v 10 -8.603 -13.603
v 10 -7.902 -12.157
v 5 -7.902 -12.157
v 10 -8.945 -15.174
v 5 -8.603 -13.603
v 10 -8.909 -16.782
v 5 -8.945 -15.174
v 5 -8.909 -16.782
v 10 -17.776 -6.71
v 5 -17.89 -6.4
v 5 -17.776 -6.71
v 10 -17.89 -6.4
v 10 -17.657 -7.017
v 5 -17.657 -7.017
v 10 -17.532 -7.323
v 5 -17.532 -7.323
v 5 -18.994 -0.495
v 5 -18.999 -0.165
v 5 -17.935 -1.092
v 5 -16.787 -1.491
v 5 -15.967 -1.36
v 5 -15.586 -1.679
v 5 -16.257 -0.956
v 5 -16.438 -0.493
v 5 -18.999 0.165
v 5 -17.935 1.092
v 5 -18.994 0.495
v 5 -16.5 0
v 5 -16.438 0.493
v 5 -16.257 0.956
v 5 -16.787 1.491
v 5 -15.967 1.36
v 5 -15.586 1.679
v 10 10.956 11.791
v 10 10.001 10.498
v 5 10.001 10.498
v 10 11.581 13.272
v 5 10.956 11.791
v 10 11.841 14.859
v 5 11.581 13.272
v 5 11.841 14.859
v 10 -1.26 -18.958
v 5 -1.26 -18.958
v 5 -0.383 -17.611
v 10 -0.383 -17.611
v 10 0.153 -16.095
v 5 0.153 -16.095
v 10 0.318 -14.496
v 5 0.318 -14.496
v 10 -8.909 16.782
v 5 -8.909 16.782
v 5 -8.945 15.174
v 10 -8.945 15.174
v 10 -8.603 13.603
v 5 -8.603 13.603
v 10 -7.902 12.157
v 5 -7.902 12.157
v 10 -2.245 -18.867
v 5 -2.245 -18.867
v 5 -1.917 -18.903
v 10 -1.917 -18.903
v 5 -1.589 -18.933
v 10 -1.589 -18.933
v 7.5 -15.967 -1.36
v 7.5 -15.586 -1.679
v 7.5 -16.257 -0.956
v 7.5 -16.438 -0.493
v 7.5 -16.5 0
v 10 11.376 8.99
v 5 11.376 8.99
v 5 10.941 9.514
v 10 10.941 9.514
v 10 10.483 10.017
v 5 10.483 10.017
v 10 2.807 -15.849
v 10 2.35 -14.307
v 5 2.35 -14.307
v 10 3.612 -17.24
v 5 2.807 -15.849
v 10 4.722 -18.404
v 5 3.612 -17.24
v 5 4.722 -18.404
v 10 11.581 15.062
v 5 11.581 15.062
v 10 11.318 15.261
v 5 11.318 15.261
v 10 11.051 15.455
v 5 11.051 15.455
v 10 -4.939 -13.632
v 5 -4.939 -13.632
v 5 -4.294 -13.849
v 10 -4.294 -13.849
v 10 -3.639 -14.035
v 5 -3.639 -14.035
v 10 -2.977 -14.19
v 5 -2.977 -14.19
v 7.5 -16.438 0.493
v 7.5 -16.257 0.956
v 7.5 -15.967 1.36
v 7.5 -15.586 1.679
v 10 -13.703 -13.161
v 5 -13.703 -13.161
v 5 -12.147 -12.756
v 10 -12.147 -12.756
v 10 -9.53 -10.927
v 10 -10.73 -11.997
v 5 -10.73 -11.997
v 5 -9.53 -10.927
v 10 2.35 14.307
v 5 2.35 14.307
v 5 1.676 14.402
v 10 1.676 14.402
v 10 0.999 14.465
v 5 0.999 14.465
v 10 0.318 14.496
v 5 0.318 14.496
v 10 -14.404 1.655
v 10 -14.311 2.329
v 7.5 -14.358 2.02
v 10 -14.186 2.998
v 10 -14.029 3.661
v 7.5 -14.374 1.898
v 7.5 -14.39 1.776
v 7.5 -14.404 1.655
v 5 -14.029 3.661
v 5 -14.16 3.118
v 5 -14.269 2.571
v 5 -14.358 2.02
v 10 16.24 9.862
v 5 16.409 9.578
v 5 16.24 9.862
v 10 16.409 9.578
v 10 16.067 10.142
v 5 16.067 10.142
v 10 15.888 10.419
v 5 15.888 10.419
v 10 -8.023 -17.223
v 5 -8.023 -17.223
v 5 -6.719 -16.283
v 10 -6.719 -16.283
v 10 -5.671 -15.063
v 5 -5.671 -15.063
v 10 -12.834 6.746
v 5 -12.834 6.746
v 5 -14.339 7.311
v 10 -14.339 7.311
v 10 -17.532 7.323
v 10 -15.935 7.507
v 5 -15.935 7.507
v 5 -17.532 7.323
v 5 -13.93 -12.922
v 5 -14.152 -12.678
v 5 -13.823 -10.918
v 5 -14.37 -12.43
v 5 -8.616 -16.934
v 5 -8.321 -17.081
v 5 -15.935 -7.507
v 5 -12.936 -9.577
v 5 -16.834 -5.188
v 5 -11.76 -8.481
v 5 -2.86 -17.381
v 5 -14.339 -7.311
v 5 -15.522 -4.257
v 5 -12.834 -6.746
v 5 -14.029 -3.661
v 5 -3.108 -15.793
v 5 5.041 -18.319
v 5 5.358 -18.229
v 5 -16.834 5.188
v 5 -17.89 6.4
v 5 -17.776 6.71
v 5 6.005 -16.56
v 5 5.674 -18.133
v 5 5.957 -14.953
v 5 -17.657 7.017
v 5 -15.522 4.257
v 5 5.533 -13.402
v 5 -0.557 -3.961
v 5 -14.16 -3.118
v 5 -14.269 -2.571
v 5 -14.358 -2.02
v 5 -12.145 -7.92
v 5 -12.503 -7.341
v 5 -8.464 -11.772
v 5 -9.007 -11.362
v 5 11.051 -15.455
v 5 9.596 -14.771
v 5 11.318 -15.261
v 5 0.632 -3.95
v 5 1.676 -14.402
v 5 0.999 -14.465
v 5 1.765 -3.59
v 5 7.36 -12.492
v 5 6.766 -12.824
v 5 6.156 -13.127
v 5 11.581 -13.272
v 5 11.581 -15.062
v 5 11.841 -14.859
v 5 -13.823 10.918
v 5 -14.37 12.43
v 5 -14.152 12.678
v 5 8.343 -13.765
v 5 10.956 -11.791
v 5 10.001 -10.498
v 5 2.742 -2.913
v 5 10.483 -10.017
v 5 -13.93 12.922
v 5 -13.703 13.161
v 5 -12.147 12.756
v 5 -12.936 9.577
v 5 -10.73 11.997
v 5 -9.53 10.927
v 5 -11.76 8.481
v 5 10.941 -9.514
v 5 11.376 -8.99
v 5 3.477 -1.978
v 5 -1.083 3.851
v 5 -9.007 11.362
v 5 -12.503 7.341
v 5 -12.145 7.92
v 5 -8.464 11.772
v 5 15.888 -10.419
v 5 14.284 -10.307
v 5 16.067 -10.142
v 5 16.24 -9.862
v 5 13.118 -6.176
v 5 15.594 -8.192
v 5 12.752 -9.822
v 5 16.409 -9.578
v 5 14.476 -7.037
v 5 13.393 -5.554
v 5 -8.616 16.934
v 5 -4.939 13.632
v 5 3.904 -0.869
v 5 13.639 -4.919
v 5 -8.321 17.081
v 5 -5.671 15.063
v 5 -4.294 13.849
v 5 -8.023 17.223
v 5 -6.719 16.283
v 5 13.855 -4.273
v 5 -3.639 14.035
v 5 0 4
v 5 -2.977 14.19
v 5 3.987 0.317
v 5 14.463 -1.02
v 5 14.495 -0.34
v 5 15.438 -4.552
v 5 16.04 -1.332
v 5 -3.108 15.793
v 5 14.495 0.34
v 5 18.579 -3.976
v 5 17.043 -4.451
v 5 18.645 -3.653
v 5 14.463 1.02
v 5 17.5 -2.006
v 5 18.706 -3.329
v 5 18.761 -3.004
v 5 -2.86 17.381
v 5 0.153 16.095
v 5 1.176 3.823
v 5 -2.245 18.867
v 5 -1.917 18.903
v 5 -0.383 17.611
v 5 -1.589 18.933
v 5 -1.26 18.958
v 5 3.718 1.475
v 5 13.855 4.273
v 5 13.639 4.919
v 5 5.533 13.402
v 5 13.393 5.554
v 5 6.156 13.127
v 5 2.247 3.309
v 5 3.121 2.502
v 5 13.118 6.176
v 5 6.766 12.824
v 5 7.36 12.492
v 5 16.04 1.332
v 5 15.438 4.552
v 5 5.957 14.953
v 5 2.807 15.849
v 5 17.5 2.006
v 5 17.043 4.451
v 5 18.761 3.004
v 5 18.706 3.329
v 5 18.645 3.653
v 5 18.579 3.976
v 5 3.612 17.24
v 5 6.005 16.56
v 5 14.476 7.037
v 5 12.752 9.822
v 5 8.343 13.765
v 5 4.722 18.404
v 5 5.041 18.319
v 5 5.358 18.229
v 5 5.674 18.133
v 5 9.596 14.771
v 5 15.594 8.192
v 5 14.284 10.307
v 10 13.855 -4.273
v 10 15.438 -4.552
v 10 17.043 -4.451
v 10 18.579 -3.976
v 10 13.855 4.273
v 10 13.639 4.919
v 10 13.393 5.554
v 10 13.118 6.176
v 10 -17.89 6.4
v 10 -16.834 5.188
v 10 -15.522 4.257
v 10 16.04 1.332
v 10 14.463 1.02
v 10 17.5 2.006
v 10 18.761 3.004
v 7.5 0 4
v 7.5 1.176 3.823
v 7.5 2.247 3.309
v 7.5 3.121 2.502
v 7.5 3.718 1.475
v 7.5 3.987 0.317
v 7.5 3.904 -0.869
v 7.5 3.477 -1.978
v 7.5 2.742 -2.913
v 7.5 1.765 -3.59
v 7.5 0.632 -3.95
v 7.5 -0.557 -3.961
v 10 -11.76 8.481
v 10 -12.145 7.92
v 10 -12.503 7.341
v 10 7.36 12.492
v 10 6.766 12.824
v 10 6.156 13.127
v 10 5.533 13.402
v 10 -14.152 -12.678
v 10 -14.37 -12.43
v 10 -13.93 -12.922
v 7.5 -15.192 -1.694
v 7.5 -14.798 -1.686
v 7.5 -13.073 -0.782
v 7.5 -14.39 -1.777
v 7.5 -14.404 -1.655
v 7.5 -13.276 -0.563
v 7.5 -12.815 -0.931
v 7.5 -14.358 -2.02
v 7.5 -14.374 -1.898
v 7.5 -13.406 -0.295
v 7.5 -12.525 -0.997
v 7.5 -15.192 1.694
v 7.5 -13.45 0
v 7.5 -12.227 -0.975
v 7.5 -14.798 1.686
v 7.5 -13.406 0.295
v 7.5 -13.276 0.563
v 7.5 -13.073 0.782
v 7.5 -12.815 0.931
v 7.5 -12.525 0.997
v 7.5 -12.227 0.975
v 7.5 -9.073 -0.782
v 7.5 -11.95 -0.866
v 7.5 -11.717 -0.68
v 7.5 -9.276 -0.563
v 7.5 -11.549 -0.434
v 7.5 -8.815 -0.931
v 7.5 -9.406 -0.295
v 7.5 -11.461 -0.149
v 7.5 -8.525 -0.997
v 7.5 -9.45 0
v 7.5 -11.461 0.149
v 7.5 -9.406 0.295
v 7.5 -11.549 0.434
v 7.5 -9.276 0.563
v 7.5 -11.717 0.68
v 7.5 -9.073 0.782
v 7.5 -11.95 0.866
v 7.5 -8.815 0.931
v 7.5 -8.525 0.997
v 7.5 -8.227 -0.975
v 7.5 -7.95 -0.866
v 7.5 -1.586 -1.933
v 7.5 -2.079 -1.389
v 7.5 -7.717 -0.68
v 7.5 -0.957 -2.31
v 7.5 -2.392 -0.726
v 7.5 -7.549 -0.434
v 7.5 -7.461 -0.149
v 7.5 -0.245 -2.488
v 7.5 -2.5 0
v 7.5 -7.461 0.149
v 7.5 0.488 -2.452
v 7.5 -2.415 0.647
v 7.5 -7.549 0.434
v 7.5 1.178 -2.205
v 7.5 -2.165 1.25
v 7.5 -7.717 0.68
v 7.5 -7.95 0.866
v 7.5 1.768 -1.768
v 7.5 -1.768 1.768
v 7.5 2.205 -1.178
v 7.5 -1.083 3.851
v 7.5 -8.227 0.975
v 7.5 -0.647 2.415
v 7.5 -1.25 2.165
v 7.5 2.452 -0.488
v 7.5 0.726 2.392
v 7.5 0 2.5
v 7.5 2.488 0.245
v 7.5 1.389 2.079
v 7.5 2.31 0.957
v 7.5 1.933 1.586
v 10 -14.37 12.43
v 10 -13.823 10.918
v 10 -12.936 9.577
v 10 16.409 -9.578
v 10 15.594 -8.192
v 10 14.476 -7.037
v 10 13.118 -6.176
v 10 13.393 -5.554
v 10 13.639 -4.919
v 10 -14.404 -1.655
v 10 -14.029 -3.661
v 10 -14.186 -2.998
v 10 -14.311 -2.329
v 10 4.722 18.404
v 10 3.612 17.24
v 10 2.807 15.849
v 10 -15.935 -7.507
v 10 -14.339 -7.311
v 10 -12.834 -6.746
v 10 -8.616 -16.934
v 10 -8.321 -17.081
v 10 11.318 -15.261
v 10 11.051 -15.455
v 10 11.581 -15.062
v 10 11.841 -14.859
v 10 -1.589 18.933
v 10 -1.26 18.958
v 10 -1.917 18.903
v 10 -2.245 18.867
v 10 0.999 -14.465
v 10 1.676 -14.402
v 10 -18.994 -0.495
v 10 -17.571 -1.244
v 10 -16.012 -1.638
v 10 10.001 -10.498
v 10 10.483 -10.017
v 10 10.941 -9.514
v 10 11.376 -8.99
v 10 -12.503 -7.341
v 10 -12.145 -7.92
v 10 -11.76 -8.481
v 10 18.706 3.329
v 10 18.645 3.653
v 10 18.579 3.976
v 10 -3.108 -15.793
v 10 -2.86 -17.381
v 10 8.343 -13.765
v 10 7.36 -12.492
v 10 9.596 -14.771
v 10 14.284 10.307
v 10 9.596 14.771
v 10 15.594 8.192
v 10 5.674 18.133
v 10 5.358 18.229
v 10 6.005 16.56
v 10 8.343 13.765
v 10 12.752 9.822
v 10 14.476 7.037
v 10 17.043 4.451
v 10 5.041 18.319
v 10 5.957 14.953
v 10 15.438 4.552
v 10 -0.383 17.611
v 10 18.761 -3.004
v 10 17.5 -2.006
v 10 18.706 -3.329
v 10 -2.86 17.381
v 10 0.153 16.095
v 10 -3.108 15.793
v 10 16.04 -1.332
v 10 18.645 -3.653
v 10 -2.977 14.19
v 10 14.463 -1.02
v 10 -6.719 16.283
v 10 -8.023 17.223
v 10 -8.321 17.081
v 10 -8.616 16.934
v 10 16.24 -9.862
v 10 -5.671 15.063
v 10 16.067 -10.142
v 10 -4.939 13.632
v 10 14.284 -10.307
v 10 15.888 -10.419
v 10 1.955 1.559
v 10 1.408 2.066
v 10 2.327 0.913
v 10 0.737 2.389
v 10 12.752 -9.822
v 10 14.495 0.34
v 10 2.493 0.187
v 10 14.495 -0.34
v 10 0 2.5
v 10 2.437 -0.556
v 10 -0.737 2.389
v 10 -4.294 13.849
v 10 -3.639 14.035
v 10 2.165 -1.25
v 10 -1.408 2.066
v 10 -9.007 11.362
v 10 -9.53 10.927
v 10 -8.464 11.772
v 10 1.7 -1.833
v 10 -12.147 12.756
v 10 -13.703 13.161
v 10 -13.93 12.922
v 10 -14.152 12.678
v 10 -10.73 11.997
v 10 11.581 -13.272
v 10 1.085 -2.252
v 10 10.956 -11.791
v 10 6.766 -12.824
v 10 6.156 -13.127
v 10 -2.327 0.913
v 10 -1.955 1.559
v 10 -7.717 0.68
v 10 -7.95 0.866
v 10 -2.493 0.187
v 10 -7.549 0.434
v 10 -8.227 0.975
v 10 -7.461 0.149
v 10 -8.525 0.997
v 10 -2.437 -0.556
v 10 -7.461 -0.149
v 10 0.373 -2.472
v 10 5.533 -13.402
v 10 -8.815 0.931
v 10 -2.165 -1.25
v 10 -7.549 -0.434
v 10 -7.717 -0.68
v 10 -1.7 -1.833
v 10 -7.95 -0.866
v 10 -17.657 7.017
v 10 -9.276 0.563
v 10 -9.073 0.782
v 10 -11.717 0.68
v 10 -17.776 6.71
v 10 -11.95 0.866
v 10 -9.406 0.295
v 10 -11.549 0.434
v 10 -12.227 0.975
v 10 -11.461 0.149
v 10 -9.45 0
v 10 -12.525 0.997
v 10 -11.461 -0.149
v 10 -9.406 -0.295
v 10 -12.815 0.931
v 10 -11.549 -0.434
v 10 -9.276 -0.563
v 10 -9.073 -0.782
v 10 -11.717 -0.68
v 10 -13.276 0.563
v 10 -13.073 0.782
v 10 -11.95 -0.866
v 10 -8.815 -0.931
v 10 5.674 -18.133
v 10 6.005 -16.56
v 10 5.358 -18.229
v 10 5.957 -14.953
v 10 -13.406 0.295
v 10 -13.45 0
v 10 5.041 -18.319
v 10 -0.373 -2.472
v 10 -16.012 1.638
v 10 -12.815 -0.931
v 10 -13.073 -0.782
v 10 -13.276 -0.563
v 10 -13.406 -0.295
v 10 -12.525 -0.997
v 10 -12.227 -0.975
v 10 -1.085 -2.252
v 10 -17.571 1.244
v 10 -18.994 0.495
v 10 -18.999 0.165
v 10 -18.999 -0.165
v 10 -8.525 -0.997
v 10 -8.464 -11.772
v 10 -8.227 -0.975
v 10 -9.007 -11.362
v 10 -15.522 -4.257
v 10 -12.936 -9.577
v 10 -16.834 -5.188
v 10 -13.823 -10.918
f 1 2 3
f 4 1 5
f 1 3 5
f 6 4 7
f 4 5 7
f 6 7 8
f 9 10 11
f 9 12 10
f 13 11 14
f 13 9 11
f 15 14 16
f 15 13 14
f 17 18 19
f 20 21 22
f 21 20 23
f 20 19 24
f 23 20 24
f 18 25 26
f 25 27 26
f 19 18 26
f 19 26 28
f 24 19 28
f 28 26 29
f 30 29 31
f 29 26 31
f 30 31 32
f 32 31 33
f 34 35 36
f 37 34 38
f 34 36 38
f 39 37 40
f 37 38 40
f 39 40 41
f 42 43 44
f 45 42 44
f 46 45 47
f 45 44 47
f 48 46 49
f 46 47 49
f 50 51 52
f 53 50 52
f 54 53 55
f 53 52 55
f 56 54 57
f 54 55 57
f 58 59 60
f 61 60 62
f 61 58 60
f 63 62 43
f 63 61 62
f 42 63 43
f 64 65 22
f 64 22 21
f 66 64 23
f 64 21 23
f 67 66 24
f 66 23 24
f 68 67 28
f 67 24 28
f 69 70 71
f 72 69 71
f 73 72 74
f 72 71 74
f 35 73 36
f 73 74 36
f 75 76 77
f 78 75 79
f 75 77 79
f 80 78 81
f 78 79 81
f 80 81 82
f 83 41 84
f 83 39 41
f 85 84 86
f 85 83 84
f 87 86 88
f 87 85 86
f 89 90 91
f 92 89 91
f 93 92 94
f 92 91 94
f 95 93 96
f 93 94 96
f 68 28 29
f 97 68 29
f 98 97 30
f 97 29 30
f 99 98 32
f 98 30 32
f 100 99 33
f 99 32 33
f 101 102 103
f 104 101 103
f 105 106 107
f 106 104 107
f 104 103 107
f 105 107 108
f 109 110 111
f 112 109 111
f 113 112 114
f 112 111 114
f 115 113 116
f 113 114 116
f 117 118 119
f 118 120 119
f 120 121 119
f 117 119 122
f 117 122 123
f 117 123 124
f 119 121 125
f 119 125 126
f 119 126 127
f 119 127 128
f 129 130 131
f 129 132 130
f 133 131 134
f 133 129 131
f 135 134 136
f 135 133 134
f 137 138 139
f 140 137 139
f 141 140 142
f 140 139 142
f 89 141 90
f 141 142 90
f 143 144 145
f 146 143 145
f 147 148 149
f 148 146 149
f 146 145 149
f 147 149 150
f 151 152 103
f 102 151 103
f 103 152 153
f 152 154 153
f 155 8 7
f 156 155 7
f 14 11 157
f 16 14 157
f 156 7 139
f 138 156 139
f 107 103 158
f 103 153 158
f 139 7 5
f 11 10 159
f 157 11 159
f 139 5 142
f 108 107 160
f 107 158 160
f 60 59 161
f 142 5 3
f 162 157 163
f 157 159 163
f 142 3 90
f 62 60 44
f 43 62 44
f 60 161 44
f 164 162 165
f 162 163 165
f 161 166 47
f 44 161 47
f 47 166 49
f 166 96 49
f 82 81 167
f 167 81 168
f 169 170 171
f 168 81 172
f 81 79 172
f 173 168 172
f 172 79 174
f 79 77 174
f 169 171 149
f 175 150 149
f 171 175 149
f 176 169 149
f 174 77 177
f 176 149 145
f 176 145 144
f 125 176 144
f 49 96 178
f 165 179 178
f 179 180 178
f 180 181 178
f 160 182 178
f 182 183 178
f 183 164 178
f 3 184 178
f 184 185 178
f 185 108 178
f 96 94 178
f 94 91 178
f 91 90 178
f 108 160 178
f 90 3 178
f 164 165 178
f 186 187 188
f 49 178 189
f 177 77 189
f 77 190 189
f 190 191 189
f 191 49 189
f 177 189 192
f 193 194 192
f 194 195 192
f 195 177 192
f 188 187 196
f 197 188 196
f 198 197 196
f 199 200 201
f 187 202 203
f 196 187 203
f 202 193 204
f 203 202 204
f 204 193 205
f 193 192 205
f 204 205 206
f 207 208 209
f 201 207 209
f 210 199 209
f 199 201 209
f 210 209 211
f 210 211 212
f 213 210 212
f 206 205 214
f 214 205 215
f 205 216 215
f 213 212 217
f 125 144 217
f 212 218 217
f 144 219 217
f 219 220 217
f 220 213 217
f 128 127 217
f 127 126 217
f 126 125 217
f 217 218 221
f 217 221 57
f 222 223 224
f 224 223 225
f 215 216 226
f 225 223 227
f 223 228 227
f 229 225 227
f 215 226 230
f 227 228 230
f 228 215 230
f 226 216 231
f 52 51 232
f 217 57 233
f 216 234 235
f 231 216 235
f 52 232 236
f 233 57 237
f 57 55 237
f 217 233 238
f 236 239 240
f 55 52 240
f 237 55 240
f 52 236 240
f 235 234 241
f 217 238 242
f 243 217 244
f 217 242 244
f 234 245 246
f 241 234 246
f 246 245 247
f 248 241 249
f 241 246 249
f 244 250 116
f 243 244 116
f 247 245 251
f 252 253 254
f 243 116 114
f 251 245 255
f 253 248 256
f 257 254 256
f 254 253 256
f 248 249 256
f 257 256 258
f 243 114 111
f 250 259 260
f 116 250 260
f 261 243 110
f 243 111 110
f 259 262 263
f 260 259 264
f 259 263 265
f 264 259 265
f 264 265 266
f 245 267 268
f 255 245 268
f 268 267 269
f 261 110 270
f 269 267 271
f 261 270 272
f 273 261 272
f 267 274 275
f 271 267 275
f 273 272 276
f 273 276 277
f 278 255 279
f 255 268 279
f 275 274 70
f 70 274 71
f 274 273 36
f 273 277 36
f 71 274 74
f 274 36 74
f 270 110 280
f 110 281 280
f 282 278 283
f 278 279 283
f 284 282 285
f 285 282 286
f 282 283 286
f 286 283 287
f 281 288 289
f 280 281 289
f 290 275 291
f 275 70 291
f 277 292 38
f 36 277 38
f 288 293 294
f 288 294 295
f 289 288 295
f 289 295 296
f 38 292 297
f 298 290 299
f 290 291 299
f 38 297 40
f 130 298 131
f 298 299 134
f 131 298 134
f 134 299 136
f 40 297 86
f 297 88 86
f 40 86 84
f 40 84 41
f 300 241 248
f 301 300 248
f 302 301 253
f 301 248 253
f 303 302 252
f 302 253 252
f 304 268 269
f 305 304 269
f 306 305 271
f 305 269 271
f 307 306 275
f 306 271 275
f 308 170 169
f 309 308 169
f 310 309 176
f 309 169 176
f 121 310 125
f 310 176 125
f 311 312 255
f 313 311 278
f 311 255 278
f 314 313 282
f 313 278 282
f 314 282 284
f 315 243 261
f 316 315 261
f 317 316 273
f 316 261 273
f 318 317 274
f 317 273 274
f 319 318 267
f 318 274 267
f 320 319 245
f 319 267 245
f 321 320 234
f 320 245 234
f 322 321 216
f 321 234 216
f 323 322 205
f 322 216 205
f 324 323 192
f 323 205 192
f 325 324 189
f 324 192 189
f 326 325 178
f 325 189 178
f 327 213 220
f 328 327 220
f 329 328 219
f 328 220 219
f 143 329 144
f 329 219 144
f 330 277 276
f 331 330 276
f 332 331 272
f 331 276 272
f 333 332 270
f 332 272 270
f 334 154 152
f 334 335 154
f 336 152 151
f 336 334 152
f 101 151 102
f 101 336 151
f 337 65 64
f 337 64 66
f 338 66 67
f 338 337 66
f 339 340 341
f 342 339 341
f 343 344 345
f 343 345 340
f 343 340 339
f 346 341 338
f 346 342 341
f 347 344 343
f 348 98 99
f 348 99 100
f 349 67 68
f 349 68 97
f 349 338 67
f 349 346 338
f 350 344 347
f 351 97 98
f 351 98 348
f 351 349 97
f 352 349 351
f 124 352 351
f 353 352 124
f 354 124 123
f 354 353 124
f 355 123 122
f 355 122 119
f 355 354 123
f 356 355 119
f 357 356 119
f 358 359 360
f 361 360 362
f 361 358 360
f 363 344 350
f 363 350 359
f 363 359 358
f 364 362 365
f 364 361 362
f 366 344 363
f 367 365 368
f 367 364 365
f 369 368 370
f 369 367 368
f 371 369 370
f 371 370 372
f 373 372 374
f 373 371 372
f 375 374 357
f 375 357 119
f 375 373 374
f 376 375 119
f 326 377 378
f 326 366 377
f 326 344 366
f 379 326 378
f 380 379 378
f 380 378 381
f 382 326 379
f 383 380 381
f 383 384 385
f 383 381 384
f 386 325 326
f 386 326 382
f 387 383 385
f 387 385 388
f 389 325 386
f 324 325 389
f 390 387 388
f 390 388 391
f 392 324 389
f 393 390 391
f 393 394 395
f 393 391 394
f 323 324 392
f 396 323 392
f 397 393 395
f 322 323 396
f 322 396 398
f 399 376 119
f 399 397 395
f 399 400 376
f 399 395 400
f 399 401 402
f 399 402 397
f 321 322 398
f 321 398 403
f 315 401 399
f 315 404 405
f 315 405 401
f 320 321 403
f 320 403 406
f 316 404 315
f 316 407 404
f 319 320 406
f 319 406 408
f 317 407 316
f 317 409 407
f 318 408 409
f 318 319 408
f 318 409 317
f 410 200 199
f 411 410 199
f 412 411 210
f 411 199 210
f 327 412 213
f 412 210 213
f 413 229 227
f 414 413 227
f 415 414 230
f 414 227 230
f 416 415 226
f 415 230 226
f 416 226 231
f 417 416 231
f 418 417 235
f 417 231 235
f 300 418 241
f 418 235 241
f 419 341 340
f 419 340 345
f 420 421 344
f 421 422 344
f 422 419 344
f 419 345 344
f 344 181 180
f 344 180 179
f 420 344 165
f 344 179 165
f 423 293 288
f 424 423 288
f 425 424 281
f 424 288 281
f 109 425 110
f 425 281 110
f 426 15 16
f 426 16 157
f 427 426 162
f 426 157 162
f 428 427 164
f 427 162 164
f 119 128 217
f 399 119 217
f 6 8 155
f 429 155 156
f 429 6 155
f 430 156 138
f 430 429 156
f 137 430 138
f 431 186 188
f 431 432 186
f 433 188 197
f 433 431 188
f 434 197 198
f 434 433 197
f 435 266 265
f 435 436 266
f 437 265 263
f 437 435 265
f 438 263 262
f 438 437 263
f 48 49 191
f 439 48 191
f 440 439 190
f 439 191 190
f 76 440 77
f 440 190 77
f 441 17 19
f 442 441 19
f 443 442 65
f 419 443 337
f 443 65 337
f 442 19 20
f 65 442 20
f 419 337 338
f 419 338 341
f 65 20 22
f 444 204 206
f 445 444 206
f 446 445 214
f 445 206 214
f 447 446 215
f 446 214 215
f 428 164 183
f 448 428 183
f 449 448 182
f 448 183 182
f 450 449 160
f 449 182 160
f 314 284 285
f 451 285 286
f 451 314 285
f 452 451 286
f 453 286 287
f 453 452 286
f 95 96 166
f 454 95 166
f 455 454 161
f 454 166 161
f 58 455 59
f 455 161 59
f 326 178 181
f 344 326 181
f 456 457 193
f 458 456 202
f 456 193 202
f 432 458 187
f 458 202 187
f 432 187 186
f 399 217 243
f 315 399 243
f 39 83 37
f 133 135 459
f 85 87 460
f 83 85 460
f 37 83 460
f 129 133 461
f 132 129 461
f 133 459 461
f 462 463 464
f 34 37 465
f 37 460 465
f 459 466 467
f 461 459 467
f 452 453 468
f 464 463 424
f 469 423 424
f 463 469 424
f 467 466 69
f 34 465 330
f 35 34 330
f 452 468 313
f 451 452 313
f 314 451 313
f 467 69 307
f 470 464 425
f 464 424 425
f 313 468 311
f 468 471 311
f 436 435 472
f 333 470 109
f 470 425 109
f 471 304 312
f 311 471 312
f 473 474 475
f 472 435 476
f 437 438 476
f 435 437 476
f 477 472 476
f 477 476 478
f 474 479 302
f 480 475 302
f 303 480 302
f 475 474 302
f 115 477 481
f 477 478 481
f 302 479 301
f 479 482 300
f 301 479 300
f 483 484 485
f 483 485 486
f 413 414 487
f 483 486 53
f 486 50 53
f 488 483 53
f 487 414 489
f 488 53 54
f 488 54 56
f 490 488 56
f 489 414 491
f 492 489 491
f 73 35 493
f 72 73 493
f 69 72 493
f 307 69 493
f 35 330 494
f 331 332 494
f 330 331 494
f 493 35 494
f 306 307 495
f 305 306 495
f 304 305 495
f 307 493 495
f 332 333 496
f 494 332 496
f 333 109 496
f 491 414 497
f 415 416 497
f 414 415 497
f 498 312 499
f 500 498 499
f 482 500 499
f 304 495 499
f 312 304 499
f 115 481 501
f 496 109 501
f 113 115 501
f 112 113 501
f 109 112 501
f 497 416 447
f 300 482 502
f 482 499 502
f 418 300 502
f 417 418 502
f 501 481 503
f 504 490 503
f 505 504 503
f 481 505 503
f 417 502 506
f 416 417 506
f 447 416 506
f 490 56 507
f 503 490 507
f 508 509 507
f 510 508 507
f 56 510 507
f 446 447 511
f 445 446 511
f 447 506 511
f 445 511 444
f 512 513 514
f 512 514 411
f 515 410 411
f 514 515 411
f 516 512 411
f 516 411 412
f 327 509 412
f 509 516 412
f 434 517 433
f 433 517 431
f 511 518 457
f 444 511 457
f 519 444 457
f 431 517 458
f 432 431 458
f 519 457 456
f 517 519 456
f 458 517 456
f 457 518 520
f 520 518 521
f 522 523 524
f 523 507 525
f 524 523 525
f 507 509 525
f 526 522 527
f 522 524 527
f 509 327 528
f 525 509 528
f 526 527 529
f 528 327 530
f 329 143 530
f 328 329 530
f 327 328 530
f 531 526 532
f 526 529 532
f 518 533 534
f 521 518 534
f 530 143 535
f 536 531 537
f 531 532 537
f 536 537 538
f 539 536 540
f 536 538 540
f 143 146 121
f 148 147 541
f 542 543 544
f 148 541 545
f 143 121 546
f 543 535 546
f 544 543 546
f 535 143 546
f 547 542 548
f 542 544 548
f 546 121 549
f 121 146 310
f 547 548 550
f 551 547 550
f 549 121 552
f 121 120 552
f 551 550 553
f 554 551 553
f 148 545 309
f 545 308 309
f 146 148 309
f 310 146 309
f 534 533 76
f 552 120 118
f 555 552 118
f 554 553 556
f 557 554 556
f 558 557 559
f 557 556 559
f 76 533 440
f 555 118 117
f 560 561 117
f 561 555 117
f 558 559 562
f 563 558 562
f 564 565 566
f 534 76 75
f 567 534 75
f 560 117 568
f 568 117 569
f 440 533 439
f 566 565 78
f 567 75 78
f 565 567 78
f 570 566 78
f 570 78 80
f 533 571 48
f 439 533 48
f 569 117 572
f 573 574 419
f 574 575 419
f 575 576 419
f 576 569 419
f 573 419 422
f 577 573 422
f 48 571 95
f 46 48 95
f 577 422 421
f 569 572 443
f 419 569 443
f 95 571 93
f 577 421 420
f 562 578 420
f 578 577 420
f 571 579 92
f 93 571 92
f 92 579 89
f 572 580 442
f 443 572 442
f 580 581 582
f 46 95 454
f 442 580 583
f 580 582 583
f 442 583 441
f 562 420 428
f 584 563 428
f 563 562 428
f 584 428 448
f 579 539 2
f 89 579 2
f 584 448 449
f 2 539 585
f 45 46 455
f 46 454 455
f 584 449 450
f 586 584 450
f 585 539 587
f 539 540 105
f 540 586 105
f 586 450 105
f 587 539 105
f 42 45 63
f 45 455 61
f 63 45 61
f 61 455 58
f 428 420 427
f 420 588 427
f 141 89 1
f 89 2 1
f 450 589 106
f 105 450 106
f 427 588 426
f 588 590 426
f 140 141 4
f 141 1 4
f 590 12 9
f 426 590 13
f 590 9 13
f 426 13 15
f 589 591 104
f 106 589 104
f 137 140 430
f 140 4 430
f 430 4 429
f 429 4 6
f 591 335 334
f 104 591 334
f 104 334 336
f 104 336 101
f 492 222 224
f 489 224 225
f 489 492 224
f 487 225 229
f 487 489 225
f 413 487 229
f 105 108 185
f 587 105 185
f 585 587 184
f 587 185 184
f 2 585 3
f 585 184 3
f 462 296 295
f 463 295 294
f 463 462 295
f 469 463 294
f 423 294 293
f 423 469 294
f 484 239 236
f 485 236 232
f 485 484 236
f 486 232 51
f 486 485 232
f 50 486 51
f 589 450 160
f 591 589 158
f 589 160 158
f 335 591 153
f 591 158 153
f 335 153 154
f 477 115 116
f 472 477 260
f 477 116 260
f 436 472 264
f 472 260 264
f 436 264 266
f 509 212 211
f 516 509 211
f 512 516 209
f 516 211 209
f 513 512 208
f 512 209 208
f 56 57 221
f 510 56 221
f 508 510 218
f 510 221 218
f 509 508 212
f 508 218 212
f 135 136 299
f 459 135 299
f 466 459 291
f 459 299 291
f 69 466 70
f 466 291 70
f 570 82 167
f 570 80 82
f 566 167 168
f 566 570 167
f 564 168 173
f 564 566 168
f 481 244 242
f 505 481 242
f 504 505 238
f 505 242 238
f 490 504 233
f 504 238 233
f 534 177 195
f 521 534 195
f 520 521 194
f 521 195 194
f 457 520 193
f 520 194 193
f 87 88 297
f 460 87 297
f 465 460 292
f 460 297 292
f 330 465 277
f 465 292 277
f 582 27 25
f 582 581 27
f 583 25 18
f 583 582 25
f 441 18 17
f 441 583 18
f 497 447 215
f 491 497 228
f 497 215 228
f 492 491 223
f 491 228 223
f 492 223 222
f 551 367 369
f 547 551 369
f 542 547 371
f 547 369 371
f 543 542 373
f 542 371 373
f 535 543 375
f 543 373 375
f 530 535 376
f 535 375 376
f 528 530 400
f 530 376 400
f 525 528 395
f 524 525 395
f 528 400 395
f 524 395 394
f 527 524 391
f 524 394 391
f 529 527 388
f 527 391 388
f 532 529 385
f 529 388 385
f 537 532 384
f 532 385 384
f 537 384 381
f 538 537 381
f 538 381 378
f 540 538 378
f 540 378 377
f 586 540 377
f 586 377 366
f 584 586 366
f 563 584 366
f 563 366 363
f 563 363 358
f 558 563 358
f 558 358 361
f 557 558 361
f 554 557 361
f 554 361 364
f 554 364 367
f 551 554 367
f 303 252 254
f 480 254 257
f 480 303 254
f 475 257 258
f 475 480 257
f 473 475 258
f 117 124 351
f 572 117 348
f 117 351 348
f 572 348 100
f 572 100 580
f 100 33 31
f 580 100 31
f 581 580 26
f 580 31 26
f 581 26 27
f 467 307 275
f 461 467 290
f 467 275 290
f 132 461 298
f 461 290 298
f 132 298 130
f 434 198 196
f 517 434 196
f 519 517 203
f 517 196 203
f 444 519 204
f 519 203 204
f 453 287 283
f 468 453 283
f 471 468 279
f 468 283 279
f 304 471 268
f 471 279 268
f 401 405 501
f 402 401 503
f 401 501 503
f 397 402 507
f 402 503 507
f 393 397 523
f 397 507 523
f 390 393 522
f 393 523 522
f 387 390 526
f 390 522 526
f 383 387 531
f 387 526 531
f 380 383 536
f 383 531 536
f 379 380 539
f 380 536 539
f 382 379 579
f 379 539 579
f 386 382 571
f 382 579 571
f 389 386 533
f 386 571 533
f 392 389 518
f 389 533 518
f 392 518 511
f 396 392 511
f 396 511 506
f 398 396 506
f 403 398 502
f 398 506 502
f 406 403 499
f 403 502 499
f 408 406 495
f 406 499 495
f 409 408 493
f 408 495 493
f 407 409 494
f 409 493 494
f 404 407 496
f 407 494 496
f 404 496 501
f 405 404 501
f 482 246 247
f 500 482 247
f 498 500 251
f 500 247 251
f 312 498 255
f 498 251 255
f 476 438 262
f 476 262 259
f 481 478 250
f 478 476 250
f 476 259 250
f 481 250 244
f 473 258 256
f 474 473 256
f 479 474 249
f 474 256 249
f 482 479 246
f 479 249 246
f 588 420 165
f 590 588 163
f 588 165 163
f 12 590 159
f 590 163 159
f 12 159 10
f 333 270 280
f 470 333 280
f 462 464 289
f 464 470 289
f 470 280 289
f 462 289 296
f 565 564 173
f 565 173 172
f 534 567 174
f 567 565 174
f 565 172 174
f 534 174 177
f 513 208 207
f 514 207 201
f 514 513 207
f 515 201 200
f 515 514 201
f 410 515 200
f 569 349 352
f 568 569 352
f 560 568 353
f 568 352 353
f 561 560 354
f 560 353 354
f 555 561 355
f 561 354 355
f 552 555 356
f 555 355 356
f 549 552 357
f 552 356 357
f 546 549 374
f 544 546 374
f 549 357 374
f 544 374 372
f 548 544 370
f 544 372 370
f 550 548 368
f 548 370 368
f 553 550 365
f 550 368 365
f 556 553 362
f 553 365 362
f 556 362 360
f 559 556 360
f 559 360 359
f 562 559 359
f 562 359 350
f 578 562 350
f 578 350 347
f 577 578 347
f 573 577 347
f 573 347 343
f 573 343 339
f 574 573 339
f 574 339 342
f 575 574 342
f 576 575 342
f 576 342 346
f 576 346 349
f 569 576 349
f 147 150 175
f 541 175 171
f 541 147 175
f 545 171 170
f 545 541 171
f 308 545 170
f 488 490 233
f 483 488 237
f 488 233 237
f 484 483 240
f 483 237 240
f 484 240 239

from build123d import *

# Parameters (mm, degrees)
BASPROSKE_W             = 10
BASPROSKE_H             = 19
TOOTHCUT_DEPTH          = 29.670542374
TEETHCUTS_COUNT         = 17
TEETHCUTS_ANGLE         = 338.823529412
BORSKE_R                = 2.5
BORE_DEPTH              = 50.0008636
CUT_EXTRUDE1_DEPTH      = 20
CUT_EXTRUDE1_DEPTH_BACK = 20
SKETCH1_W               = 10
SKETCH1_H               = 40
CUT_EXTRUDE3_DEPTH      = 2.5
SKETCH3_R               = 1
CUT_EXTRUDE4_DEPTH      = 27.95667967


with BuildPart() as part:
    # BasProSke → Base-Revolve (revolve)
    with BuildSketch(Plane(origin=(0, 0, 0), x_dir=(1, 0, 0), z_dir=(0, 1, 0))):
        with Locations((5, 9.5)):
            Rectangle(BASPROSKE_W, BASPROSKE_H)
    revolve(axis=Axis((-10, 0, 0), (1, 0, 0)))

    # TooCutSke → ToothCut (cut, through all)
    with BuildSketch(Plane(origin=(0, 0, 0), x_dir=(0, 0, -1), z_dir=(1, 0, 0))):
        with BuildLine():
            ThreePointArc((1.020352389, 14.463052306), (0, 14.499), (-1.020352389, 14.463052306))
            ThreePointArc((-1.020352389, 14.463052306), (-1.632621885, 16.804485203), (-3.026143023, 18.783192049))
            ThreePointArc((-3.026143023, 18.783192049), (0, 19.0254), (3.026143023, 18.783192049))
            ThreePointArc((3.026143023, 18.783192049), (1.632621885, 16.804485203), (1.020352389, 14.463052306))
        make_face()
    toothcut = extrude(amount=TOOTHCUT_DEPTH, mode=Mode.SUBTRACT)

    # TeethCuts: ToothCut ×17 about axis
    teethcuts_axis = Axis((-10, 0, 0), (1, 0, 0))
    for i in range(1, TEETHCUTS_COUNT):
        add(toothcut.rotate(teethcuts_axis, i * TEETHCUTS_ANGLE / (TEETHCUTS_COUNT - 1)), mode=Mode.SUBTRACT)

    # BorSke → Bore (cut, symmetric)
    with BuildSketch(Plane(origin=(0, 0, 0), x_dir=(0, 0, -1), z_dir=(1, 0, 0))):
        Circle(BORSKE_R)
    extrude(amount=BORE_DEPTH, both=True, mode=Mode.SUBTRACT)

    # Sketch1 → Cut-Extrude1 (cut, two sides: drawn at the far end of the back side and taken through both)
    with BuildSketch(Plane.XY.offset(-CUT_EXTRUDE1_DEPTH_BACK)):
        Rectangle(SKETCH1_W, SKETCH1_H)
    extrude(amount=CUT_EXTRUDE1_DEPTH + CUT_EXTRUDE1_DEPTH_BACK, mode=Mode.SUBTRACT)

    # Sketch2 → Cut-Extrude3 (cut)
    with BuildSketch(Plane.ZY.offset(-5)):
        with BuildLine():
            Line((2, -14.5), (4, 0))
            ThreePointArc((4, 0), (-0.279231906, 3.99024179), (-3.961014771, -0.557101411))
            Line((-3.961014771, -0.557101411), (-2, -14.5))
            ThreePointArc((-2, -14.5), (0, -16.5), (2, -14.5))
        make_face()
    extrude(amount=-CUT_EXTRUDE3_DEPTH, mode=Mode.SUBTRACT)

    # Sketch3 → Cut-Extrude4 (cut, through all)
    with BuildSketch(Plane.ZY.offset(-7.5)):
        with Locations((0, -12.45)):
            Circle(SKETCH3_R)
        with Locations((0, -8.45)):
            Circle(SKETCH3_R)
    extrude(amount=-CUT_EXTRUDE4_DEPTH, mode=Mode.SUBTRACT)


solid = part.part
